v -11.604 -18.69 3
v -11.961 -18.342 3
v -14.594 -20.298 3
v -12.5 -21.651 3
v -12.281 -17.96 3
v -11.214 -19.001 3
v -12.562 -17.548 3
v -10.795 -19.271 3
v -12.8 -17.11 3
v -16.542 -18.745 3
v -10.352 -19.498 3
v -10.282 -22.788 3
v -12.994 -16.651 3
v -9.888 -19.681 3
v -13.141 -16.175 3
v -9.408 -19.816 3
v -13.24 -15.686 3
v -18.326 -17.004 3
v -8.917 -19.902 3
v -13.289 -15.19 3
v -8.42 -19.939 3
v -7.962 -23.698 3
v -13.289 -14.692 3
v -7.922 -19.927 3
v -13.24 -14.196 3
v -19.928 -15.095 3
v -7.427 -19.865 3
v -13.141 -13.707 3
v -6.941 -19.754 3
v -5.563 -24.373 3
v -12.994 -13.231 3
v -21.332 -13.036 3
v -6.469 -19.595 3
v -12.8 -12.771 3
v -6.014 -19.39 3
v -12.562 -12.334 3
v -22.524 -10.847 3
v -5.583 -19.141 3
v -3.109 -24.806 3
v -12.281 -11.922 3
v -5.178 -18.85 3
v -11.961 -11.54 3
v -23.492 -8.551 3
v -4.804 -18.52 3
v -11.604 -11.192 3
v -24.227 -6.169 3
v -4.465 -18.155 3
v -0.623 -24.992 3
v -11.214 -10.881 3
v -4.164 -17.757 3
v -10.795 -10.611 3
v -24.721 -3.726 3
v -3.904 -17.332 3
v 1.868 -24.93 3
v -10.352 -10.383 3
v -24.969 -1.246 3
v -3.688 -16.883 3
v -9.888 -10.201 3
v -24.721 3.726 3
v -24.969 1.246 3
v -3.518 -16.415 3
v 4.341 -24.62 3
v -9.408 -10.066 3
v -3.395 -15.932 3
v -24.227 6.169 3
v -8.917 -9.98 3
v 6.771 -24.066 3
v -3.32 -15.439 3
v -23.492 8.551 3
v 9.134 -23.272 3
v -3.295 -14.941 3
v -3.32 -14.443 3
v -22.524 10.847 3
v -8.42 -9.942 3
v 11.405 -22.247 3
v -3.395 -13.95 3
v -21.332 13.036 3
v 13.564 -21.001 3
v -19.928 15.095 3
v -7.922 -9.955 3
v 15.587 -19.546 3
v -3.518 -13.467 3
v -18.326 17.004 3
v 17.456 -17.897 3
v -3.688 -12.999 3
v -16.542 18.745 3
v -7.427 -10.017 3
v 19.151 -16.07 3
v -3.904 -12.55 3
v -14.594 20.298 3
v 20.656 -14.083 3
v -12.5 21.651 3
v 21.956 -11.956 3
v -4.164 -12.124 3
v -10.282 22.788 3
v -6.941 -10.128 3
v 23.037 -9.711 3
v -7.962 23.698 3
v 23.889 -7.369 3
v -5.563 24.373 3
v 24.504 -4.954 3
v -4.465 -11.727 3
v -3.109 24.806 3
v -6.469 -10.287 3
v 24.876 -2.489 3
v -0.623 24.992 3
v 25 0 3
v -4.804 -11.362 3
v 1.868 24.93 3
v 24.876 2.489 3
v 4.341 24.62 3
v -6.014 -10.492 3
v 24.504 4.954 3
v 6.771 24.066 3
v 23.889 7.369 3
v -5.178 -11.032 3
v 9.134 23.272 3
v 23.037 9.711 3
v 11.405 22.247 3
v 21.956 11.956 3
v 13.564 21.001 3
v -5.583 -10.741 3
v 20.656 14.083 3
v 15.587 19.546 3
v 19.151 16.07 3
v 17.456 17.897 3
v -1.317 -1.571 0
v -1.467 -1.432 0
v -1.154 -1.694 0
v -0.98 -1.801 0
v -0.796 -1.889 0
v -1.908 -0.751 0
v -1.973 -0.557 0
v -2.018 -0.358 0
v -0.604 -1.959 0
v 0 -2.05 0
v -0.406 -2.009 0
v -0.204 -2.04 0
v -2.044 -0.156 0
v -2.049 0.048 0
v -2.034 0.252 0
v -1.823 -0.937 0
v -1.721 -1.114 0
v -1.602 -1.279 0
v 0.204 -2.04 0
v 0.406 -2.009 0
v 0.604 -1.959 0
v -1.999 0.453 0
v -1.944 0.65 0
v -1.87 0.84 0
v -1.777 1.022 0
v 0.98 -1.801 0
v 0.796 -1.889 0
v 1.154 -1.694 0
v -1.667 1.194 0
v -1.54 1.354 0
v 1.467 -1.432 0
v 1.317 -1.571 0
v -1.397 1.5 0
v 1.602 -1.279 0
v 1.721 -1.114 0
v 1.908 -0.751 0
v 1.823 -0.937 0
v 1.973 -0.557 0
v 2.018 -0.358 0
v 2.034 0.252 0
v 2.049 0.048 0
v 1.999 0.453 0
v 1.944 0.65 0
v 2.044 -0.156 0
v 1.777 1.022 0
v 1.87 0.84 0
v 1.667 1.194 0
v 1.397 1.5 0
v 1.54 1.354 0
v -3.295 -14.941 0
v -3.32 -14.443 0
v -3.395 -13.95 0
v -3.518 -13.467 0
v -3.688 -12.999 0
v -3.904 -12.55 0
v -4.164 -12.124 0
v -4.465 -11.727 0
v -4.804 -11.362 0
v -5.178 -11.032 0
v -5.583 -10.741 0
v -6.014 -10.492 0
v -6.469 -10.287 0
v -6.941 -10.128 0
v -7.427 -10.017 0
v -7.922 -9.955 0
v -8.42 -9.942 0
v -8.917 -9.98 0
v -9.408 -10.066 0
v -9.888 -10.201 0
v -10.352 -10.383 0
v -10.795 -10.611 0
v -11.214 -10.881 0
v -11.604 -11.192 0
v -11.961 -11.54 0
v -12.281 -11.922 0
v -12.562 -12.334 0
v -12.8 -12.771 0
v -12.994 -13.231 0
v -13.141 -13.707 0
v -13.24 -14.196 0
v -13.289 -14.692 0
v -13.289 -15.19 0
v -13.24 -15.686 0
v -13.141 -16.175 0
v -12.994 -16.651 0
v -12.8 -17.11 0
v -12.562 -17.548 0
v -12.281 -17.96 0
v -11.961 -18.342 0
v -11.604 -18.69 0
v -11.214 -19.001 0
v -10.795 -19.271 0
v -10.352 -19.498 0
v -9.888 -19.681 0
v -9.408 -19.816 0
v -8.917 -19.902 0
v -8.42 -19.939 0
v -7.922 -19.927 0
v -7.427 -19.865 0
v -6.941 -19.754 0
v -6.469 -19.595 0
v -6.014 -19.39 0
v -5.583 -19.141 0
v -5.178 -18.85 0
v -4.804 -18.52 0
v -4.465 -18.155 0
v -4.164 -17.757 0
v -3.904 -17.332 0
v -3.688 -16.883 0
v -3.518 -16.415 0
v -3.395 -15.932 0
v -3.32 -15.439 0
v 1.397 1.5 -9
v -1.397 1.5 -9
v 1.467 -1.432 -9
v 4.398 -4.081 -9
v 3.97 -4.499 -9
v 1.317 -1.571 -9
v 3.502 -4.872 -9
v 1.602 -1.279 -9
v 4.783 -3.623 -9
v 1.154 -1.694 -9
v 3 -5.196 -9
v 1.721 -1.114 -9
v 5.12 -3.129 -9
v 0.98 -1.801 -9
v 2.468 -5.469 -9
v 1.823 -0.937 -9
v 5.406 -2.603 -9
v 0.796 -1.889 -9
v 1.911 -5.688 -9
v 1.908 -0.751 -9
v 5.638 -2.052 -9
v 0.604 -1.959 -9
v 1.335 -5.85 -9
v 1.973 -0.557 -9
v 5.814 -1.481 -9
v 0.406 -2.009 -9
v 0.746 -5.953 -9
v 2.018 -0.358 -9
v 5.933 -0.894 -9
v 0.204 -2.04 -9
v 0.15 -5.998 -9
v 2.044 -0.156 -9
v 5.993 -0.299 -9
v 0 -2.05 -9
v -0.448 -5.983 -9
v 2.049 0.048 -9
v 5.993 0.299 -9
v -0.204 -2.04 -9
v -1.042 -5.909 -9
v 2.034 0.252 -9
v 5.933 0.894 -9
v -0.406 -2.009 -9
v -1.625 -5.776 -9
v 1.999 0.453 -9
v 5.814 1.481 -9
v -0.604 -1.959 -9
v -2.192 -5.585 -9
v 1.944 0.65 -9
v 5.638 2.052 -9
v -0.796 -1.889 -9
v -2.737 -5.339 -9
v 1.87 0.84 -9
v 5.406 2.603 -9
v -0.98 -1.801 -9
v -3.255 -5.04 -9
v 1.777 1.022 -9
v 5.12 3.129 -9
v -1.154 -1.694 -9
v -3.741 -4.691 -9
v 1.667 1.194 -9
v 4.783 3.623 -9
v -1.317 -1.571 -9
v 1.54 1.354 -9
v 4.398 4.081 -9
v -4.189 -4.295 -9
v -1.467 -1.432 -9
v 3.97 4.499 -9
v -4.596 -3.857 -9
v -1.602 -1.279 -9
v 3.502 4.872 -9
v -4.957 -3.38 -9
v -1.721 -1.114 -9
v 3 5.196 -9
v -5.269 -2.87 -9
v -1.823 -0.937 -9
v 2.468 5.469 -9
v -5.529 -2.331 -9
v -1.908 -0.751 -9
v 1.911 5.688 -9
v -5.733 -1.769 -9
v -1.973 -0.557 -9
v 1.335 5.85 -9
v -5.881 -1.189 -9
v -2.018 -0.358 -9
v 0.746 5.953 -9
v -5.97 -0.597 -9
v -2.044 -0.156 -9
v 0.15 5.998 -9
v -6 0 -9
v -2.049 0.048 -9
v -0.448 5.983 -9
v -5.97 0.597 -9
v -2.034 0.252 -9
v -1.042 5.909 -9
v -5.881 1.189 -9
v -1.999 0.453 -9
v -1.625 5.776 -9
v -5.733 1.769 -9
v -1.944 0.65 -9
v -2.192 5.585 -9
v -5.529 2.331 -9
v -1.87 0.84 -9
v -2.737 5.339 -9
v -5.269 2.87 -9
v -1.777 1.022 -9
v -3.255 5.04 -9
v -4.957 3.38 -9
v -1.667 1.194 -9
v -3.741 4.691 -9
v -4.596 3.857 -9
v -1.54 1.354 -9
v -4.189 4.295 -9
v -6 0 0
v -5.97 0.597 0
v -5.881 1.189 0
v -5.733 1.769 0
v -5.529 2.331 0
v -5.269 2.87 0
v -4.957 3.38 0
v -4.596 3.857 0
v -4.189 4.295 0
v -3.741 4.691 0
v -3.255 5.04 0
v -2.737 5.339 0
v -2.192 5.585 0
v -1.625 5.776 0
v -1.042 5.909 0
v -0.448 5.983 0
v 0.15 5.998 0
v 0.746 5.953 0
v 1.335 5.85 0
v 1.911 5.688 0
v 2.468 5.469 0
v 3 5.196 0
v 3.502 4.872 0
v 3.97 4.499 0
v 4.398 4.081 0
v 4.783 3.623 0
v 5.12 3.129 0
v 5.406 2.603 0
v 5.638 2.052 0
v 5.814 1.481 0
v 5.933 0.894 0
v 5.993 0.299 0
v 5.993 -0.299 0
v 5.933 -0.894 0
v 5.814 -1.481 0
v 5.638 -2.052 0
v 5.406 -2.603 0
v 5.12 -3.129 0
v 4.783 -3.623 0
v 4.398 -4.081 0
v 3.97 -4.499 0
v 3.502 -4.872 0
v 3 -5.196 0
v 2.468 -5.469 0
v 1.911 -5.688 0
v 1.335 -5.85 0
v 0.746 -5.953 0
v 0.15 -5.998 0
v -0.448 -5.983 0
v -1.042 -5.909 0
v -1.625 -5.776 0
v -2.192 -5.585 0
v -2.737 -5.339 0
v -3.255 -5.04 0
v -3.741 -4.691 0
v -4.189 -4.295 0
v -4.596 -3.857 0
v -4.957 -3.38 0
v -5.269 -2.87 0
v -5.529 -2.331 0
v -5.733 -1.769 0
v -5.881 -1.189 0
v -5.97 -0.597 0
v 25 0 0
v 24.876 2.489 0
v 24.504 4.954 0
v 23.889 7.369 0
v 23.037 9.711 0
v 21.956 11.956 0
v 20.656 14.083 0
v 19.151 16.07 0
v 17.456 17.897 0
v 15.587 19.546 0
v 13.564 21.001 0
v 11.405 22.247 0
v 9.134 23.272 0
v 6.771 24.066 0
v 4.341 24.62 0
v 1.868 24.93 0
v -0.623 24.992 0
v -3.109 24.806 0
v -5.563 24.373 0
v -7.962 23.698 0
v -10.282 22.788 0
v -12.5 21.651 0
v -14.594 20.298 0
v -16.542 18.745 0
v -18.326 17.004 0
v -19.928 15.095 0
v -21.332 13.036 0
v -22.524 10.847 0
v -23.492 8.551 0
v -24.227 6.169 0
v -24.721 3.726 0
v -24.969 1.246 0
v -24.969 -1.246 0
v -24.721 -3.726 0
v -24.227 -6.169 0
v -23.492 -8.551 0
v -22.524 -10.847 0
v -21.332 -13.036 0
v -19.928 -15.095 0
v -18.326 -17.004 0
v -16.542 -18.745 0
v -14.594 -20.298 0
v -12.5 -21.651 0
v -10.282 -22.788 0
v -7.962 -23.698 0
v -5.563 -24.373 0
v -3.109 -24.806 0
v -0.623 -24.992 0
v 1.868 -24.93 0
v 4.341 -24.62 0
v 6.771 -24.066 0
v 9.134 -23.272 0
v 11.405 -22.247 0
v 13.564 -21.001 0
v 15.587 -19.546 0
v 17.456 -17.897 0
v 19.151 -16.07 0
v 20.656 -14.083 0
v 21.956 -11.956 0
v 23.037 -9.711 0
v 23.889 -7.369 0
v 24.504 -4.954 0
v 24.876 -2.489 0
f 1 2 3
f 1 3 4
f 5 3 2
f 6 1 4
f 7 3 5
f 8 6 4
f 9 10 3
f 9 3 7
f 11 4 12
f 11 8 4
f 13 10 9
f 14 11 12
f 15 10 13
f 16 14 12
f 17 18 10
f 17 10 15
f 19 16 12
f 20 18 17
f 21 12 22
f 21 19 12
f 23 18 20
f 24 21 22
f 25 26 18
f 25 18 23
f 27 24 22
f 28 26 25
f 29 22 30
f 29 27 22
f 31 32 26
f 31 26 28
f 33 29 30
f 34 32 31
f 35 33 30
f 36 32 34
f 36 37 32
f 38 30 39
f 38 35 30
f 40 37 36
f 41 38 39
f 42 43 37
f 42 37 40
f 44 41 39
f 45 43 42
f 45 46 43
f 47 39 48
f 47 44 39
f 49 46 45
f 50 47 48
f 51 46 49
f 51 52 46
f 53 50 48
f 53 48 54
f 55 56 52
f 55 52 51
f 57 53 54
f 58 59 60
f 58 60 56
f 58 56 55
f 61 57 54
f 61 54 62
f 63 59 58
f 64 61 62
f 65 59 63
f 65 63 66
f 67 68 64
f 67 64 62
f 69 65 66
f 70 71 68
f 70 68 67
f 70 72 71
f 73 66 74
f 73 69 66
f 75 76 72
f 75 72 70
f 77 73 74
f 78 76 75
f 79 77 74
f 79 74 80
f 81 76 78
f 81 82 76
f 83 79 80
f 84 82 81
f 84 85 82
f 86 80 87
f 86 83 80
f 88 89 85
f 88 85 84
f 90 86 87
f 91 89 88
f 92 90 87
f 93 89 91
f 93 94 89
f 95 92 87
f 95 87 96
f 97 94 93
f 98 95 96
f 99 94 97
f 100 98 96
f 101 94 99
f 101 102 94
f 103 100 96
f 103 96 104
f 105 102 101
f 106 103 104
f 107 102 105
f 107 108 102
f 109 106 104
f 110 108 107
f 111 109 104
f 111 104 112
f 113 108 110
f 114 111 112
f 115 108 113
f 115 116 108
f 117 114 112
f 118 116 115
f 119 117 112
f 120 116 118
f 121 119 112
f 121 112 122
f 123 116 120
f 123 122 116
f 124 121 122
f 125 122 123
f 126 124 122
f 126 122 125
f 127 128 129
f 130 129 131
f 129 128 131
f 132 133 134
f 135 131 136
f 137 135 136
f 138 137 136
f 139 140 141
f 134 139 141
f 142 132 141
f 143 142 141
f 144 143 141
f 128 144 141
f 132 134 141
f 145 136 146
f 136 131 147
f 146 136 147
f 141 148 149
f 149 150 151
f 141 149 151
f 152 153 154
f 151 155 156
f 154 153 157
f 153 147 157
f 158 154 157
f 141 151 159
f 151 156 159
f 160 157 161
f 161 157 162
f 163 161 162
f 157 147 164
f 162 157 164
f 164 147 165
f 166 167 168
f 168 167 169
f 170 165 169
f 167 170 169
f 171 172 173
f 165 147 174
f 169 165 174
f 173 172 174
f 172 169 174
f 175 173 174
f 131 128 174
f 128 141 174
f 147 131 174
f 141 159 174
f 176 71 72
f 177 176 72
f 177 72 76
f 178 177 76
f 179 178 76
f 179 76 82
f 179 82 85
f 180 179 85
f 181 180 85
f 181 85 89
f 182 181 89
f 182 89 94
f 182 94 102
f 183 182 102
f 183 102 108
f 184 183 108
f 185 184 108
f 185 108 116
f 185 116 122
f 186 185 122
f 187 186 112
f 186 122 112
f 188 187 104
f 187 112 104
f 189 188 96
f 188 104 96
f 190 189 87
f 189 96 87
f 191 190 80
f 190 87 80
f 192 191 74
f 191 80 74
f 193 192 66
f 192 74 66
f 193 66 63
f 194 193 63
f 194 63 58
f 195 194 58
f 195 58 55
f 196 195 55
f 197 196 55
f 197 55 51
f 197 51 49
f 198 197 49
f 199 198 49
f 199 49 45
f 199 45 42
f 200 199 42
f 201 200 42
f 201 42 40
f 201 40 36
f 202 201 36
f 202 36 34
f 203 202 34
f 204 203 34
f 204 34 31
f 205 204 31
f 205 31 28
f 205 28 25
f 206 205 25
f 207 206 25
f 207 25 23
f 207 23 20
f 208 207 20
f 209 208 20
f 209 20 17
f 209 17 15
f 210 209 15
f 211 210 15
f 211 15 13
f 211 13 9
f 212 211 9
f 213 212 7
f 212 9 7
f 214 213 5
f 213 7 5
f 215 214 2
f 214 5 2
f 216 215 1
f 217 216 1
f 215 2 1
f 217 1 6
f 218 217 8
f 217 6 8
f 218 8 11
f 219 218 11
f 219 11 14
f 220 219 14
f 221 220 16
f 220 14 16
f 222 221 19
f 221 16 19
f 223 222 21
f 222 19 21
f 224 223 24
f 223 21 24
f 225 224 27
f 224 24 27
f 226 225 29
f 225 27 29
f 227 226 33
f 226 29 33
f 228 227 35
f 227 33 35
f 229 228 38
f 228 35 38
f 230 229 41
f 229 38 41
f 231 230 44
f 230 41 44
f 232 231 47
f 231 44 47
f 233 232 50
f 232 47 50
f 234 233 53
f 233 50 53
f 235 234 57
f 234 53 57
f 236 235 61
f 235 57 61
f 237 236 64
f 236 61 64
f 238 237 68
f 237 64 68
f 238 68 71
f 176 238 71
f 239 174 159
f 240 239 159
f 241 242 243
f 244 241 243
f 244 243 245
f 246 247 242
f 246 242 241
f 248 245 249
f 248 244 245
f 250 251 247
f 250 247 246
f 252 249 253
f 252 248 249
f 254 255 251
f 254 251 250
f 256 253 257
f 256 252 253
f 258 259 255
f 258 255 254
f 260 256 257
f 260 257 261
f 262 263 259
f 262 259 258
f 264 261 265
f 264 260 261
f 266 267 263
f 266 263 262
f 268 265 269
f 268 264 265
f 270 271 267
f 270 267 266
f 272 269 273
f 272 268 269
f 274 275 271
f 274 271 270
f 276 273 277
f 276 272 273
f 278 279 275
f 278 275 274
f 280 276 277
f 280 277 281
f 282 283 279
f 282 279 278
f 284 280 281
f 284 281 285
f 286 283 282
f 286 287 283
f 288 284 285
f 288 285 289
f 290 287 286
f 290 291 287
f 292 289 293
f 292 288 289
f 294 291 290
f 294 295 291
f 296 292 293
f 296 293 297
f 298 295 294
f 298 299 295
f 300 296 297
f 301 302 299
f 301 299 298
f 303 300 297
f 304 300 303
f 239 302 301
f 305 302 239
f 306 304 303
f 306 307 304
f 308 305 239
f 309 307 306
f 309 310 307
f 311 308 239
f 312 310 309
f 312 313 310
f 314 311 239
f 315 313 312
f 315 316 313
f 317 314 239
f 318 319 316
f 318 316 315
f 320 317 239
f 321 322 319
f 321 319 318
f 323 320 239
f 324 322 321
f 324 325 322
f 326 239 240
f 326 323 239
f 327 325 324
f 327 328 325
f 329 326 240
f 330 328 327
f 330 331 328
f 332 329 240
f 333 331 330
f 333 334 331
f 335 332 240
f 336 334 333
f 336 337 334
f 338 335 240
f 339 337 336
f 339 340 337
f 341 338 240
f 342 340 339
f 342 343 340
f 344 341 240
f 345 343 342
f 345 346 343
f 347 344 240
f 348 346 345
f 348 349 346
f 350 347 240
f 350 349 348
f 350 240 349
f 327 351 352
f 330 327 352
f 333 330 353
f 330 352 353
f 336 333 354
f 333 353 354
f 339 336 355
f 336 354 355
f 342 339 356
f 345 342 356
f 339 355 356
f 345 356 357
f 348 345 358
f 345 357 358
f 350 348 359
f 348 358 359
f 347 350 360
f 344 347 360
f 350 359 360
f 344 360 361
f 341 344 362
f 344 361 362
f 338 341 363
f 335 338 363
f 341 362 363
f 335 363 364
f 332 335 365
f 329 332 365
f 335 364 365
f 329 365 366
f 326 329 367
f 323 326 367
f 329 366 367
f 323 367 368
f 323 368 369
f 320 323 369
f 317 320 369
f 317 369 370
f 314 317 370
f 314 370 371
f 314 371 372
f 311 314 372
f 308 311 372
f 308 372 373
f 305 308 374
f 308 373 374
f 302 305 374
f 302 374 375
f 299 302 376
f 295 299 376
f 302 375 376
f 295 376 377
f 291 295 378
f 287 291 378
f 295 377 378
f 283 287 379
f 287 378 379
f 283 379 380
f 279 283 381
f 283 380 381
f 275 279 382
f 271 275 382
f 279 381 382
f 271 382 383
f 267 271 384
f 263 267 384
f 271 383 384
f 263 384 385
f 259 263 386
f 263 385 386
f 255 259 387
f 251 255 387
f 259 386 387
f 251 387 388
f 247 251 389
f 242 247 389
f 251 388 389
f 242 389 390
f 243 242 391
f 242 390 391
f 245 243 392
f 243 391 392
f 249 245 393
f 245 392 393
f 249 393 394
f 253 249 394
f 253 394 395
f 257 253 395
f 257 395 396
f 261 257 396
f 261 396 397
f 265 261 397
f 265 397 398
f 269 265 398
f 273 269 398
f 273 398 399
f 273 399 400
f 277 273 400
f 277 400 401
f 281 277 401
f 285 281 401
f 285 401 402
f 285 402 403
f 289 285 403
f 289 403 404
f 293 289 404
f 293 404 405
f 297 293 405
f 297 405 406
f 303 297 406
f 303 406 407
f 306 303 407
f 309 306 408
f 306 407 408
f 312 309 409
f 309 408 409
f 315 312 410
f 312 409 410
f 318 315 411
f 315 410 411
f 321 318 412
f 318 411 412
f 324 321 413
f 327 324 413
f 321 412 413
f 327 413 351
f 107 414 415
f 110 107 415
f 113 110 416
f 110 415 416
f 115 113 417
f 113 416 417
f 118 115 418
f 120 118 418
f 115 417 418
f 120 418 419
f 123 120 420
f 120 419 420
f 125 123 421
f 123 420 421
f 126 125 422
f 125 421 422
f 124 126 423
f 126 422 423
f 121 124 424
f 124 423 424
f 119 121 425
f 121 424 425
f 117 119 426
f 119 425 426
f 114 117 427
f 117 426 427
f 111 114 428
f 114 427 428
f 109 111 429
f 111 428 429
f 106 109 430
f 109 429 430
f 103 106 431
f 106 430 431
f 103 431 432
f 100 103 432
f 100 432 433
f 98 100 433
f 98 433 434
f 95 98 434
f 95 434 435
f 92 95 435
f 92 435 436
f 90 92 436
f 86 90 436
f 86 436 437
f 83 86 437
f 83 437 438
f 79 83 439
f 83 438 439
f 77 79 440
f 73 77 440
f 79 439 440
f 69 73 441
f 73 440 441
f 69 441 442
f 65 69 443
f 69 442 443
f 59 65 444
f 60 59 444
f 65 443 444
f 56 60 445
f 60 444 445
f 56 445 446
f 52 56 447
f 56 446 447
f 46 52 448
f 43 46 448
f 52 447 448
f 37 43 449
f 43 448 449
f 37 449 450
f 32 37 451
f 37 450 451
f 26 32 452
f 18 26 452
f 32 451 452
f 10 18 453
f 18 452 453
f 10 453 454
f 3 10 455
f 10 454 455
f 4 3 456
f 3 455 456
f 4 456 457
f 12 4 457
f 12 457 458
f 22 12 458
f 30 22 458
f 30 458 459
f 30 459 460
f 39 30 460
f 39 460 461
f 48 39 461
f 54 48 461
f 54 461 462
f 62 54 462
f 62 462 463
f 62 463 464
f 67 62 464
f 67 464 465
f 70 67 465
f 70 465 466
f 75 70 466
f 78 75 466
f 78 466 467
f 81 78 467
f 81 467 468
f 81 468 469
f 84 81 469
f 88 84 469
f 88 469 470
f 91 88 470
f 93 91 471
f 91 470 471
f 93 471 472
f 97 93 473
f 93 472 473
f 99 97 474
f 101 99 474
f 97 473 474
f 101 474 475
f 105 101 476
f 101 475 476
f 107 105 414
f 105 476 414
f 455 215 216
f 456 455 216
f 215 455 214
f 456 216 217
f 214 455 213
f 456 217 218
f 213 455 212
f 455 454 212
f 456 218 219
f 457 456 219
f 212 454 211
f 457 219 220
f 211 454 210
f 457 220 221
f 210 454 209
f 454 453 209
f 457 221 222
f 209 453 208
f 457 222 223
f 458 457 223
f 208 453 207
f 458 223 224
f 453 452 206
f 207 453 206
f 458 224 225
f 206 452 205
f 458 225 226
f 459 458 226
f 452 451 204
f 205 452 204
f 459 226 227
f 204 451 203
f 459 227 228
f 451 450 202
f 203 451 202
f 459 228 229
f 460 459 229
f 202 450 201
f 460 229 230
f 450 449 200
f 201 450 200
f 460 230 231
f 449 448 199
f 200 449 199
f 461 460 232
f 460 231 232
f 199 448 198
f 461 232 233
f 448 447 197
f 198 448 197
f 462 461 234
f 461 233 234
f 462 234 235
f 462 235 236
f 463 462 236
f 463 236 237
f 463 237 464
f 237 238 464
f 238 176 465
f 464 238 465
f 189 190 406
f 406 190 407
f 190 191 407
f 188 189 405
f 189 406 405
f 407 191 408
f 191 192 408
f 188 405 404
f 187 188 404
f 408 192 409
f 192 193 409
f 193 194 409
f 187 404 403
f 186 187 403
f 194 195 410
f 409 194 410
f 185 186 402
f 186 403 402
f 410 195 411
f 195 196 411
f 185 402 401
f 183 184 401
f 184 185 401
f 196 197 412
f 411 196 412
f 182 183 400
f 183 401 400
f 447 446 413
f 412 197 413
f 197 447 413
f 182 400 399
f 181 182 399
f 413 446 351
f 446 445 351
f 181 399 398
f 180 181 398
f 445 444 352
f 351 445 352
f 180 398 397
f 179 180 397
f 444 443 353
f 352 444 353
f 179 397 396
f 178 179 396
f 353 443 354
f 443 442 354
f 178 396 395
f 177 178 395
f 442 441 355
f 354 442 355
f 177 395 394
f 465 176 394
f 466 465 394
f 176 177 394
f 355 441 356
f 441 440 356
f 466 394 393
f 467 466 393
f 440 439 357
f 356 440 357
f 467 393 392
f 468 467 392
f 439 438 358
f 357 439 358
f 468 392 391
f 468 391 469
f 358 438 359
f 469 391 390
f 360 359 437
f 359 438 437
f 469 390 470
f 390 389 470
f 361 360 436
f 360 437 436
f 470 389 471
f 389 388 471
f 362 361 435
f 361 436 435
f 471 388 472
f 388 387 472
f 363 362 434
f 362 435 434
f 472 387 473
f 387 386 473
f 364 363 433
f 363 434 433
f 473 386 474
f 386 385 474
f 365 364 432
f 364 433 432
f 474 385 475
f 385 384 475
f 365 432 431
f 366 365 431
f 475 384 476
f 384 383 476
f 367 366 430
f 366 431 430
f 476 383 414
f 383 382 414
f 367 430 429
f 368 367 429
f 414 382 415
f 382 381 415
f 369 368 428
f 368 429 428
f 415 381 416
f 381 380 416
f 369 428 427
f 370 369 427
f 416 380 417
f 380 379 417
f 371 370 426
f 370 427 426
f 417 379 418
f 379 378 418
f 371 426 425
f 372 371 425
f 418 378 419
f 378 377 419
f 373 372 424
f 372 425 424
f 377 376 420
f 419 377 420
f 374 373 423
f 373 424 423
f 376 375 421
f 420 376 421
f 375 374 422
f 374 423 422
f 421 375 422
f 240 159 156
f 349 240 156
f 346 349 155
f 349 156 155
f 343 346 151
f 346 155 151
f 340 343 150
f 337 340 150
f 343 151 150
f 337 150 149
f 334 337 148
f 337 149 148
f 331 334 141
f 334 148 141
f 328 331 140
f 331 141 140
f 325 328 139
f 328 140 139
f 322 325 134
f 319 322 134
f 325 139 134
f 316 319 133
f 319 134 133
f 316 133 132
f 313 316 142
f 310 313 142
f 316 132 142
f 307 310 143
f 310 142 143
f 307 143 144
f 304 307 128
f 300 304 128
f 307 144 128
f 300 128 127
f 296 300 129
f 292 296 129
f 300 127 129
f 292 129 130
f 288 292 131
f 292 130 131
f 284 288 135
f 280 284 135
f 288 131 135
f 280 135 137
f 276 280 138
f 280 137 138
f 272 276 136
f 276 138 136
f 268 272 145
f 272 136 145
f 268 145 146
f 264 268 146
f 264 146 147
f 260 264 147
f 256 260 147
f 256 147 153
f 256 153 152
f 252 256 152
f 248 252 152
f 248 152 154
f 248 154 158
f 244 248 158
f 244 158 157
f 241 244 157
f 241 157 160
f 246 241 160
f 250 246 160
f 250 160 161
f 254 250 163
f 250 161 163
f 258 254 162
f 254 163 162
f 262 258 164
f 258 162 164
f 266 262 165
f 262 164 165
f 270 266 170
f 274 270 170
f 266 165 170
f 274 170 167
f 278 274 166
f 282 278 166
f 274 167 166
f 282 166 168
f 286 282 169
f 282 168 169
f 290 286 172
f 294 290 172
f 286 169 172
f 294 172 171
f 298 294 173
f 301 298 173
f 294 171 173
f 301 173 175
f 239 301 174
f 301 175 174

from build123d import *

# Parameters (mm, degrees)
ESQUISSE1_R             = 25
BOSS_EXTRU_1_DEPTH      = 3
ESQUISSE3_R             = 6
BOSS_EXTRU_3_DEPTH      = 9
ESQUISSE4_R             = 5
ENL_V_MAT_EXTRU_2_DEPTH = 5


with BuildPart() as part:
    # Esquisse1 → Boss.-Extru.1 (new body)
    with BuildSketch(Plane.XY):
        Circle(ESQUISSE1_R)
    extrude(amount=BOSS_EXTRU_1_DEPTH)

    # Esquisse3 → Boss.-Extru.3 (add)
    with BuildSketch(Plane(origin=(0, 0, 0), x_dir=(-1, 0, 0), z_dir=(0, 0, -1))):
        Circle(ESQUISSE3_R)
        with BuildLine():
            Line((-1.397318861, 1.5), (1.397318861, 1.5))
            ThreePointArc((1.397318861, 1.5), (0, -2.05), (-1.397318861, 1.5))
        make_face(mode=Mode.SUBTRACT)
    extrude(amount=BOSS_EXTRU_3_DEPTH)

    # Esquisse4 → Enlèv. mat.-Extru.2 (cut)
    with BuildSketch(Plane.XY.offset(3)):
        with Locations((-8.295445994, -14.94087289)):
            Circle(ESQUISSE4_R)
    extrude(amount=-ENL_V_MAT_EXTRU_2_DEPTH, mode=Mode.SUBTRACT)


solid = part.part
